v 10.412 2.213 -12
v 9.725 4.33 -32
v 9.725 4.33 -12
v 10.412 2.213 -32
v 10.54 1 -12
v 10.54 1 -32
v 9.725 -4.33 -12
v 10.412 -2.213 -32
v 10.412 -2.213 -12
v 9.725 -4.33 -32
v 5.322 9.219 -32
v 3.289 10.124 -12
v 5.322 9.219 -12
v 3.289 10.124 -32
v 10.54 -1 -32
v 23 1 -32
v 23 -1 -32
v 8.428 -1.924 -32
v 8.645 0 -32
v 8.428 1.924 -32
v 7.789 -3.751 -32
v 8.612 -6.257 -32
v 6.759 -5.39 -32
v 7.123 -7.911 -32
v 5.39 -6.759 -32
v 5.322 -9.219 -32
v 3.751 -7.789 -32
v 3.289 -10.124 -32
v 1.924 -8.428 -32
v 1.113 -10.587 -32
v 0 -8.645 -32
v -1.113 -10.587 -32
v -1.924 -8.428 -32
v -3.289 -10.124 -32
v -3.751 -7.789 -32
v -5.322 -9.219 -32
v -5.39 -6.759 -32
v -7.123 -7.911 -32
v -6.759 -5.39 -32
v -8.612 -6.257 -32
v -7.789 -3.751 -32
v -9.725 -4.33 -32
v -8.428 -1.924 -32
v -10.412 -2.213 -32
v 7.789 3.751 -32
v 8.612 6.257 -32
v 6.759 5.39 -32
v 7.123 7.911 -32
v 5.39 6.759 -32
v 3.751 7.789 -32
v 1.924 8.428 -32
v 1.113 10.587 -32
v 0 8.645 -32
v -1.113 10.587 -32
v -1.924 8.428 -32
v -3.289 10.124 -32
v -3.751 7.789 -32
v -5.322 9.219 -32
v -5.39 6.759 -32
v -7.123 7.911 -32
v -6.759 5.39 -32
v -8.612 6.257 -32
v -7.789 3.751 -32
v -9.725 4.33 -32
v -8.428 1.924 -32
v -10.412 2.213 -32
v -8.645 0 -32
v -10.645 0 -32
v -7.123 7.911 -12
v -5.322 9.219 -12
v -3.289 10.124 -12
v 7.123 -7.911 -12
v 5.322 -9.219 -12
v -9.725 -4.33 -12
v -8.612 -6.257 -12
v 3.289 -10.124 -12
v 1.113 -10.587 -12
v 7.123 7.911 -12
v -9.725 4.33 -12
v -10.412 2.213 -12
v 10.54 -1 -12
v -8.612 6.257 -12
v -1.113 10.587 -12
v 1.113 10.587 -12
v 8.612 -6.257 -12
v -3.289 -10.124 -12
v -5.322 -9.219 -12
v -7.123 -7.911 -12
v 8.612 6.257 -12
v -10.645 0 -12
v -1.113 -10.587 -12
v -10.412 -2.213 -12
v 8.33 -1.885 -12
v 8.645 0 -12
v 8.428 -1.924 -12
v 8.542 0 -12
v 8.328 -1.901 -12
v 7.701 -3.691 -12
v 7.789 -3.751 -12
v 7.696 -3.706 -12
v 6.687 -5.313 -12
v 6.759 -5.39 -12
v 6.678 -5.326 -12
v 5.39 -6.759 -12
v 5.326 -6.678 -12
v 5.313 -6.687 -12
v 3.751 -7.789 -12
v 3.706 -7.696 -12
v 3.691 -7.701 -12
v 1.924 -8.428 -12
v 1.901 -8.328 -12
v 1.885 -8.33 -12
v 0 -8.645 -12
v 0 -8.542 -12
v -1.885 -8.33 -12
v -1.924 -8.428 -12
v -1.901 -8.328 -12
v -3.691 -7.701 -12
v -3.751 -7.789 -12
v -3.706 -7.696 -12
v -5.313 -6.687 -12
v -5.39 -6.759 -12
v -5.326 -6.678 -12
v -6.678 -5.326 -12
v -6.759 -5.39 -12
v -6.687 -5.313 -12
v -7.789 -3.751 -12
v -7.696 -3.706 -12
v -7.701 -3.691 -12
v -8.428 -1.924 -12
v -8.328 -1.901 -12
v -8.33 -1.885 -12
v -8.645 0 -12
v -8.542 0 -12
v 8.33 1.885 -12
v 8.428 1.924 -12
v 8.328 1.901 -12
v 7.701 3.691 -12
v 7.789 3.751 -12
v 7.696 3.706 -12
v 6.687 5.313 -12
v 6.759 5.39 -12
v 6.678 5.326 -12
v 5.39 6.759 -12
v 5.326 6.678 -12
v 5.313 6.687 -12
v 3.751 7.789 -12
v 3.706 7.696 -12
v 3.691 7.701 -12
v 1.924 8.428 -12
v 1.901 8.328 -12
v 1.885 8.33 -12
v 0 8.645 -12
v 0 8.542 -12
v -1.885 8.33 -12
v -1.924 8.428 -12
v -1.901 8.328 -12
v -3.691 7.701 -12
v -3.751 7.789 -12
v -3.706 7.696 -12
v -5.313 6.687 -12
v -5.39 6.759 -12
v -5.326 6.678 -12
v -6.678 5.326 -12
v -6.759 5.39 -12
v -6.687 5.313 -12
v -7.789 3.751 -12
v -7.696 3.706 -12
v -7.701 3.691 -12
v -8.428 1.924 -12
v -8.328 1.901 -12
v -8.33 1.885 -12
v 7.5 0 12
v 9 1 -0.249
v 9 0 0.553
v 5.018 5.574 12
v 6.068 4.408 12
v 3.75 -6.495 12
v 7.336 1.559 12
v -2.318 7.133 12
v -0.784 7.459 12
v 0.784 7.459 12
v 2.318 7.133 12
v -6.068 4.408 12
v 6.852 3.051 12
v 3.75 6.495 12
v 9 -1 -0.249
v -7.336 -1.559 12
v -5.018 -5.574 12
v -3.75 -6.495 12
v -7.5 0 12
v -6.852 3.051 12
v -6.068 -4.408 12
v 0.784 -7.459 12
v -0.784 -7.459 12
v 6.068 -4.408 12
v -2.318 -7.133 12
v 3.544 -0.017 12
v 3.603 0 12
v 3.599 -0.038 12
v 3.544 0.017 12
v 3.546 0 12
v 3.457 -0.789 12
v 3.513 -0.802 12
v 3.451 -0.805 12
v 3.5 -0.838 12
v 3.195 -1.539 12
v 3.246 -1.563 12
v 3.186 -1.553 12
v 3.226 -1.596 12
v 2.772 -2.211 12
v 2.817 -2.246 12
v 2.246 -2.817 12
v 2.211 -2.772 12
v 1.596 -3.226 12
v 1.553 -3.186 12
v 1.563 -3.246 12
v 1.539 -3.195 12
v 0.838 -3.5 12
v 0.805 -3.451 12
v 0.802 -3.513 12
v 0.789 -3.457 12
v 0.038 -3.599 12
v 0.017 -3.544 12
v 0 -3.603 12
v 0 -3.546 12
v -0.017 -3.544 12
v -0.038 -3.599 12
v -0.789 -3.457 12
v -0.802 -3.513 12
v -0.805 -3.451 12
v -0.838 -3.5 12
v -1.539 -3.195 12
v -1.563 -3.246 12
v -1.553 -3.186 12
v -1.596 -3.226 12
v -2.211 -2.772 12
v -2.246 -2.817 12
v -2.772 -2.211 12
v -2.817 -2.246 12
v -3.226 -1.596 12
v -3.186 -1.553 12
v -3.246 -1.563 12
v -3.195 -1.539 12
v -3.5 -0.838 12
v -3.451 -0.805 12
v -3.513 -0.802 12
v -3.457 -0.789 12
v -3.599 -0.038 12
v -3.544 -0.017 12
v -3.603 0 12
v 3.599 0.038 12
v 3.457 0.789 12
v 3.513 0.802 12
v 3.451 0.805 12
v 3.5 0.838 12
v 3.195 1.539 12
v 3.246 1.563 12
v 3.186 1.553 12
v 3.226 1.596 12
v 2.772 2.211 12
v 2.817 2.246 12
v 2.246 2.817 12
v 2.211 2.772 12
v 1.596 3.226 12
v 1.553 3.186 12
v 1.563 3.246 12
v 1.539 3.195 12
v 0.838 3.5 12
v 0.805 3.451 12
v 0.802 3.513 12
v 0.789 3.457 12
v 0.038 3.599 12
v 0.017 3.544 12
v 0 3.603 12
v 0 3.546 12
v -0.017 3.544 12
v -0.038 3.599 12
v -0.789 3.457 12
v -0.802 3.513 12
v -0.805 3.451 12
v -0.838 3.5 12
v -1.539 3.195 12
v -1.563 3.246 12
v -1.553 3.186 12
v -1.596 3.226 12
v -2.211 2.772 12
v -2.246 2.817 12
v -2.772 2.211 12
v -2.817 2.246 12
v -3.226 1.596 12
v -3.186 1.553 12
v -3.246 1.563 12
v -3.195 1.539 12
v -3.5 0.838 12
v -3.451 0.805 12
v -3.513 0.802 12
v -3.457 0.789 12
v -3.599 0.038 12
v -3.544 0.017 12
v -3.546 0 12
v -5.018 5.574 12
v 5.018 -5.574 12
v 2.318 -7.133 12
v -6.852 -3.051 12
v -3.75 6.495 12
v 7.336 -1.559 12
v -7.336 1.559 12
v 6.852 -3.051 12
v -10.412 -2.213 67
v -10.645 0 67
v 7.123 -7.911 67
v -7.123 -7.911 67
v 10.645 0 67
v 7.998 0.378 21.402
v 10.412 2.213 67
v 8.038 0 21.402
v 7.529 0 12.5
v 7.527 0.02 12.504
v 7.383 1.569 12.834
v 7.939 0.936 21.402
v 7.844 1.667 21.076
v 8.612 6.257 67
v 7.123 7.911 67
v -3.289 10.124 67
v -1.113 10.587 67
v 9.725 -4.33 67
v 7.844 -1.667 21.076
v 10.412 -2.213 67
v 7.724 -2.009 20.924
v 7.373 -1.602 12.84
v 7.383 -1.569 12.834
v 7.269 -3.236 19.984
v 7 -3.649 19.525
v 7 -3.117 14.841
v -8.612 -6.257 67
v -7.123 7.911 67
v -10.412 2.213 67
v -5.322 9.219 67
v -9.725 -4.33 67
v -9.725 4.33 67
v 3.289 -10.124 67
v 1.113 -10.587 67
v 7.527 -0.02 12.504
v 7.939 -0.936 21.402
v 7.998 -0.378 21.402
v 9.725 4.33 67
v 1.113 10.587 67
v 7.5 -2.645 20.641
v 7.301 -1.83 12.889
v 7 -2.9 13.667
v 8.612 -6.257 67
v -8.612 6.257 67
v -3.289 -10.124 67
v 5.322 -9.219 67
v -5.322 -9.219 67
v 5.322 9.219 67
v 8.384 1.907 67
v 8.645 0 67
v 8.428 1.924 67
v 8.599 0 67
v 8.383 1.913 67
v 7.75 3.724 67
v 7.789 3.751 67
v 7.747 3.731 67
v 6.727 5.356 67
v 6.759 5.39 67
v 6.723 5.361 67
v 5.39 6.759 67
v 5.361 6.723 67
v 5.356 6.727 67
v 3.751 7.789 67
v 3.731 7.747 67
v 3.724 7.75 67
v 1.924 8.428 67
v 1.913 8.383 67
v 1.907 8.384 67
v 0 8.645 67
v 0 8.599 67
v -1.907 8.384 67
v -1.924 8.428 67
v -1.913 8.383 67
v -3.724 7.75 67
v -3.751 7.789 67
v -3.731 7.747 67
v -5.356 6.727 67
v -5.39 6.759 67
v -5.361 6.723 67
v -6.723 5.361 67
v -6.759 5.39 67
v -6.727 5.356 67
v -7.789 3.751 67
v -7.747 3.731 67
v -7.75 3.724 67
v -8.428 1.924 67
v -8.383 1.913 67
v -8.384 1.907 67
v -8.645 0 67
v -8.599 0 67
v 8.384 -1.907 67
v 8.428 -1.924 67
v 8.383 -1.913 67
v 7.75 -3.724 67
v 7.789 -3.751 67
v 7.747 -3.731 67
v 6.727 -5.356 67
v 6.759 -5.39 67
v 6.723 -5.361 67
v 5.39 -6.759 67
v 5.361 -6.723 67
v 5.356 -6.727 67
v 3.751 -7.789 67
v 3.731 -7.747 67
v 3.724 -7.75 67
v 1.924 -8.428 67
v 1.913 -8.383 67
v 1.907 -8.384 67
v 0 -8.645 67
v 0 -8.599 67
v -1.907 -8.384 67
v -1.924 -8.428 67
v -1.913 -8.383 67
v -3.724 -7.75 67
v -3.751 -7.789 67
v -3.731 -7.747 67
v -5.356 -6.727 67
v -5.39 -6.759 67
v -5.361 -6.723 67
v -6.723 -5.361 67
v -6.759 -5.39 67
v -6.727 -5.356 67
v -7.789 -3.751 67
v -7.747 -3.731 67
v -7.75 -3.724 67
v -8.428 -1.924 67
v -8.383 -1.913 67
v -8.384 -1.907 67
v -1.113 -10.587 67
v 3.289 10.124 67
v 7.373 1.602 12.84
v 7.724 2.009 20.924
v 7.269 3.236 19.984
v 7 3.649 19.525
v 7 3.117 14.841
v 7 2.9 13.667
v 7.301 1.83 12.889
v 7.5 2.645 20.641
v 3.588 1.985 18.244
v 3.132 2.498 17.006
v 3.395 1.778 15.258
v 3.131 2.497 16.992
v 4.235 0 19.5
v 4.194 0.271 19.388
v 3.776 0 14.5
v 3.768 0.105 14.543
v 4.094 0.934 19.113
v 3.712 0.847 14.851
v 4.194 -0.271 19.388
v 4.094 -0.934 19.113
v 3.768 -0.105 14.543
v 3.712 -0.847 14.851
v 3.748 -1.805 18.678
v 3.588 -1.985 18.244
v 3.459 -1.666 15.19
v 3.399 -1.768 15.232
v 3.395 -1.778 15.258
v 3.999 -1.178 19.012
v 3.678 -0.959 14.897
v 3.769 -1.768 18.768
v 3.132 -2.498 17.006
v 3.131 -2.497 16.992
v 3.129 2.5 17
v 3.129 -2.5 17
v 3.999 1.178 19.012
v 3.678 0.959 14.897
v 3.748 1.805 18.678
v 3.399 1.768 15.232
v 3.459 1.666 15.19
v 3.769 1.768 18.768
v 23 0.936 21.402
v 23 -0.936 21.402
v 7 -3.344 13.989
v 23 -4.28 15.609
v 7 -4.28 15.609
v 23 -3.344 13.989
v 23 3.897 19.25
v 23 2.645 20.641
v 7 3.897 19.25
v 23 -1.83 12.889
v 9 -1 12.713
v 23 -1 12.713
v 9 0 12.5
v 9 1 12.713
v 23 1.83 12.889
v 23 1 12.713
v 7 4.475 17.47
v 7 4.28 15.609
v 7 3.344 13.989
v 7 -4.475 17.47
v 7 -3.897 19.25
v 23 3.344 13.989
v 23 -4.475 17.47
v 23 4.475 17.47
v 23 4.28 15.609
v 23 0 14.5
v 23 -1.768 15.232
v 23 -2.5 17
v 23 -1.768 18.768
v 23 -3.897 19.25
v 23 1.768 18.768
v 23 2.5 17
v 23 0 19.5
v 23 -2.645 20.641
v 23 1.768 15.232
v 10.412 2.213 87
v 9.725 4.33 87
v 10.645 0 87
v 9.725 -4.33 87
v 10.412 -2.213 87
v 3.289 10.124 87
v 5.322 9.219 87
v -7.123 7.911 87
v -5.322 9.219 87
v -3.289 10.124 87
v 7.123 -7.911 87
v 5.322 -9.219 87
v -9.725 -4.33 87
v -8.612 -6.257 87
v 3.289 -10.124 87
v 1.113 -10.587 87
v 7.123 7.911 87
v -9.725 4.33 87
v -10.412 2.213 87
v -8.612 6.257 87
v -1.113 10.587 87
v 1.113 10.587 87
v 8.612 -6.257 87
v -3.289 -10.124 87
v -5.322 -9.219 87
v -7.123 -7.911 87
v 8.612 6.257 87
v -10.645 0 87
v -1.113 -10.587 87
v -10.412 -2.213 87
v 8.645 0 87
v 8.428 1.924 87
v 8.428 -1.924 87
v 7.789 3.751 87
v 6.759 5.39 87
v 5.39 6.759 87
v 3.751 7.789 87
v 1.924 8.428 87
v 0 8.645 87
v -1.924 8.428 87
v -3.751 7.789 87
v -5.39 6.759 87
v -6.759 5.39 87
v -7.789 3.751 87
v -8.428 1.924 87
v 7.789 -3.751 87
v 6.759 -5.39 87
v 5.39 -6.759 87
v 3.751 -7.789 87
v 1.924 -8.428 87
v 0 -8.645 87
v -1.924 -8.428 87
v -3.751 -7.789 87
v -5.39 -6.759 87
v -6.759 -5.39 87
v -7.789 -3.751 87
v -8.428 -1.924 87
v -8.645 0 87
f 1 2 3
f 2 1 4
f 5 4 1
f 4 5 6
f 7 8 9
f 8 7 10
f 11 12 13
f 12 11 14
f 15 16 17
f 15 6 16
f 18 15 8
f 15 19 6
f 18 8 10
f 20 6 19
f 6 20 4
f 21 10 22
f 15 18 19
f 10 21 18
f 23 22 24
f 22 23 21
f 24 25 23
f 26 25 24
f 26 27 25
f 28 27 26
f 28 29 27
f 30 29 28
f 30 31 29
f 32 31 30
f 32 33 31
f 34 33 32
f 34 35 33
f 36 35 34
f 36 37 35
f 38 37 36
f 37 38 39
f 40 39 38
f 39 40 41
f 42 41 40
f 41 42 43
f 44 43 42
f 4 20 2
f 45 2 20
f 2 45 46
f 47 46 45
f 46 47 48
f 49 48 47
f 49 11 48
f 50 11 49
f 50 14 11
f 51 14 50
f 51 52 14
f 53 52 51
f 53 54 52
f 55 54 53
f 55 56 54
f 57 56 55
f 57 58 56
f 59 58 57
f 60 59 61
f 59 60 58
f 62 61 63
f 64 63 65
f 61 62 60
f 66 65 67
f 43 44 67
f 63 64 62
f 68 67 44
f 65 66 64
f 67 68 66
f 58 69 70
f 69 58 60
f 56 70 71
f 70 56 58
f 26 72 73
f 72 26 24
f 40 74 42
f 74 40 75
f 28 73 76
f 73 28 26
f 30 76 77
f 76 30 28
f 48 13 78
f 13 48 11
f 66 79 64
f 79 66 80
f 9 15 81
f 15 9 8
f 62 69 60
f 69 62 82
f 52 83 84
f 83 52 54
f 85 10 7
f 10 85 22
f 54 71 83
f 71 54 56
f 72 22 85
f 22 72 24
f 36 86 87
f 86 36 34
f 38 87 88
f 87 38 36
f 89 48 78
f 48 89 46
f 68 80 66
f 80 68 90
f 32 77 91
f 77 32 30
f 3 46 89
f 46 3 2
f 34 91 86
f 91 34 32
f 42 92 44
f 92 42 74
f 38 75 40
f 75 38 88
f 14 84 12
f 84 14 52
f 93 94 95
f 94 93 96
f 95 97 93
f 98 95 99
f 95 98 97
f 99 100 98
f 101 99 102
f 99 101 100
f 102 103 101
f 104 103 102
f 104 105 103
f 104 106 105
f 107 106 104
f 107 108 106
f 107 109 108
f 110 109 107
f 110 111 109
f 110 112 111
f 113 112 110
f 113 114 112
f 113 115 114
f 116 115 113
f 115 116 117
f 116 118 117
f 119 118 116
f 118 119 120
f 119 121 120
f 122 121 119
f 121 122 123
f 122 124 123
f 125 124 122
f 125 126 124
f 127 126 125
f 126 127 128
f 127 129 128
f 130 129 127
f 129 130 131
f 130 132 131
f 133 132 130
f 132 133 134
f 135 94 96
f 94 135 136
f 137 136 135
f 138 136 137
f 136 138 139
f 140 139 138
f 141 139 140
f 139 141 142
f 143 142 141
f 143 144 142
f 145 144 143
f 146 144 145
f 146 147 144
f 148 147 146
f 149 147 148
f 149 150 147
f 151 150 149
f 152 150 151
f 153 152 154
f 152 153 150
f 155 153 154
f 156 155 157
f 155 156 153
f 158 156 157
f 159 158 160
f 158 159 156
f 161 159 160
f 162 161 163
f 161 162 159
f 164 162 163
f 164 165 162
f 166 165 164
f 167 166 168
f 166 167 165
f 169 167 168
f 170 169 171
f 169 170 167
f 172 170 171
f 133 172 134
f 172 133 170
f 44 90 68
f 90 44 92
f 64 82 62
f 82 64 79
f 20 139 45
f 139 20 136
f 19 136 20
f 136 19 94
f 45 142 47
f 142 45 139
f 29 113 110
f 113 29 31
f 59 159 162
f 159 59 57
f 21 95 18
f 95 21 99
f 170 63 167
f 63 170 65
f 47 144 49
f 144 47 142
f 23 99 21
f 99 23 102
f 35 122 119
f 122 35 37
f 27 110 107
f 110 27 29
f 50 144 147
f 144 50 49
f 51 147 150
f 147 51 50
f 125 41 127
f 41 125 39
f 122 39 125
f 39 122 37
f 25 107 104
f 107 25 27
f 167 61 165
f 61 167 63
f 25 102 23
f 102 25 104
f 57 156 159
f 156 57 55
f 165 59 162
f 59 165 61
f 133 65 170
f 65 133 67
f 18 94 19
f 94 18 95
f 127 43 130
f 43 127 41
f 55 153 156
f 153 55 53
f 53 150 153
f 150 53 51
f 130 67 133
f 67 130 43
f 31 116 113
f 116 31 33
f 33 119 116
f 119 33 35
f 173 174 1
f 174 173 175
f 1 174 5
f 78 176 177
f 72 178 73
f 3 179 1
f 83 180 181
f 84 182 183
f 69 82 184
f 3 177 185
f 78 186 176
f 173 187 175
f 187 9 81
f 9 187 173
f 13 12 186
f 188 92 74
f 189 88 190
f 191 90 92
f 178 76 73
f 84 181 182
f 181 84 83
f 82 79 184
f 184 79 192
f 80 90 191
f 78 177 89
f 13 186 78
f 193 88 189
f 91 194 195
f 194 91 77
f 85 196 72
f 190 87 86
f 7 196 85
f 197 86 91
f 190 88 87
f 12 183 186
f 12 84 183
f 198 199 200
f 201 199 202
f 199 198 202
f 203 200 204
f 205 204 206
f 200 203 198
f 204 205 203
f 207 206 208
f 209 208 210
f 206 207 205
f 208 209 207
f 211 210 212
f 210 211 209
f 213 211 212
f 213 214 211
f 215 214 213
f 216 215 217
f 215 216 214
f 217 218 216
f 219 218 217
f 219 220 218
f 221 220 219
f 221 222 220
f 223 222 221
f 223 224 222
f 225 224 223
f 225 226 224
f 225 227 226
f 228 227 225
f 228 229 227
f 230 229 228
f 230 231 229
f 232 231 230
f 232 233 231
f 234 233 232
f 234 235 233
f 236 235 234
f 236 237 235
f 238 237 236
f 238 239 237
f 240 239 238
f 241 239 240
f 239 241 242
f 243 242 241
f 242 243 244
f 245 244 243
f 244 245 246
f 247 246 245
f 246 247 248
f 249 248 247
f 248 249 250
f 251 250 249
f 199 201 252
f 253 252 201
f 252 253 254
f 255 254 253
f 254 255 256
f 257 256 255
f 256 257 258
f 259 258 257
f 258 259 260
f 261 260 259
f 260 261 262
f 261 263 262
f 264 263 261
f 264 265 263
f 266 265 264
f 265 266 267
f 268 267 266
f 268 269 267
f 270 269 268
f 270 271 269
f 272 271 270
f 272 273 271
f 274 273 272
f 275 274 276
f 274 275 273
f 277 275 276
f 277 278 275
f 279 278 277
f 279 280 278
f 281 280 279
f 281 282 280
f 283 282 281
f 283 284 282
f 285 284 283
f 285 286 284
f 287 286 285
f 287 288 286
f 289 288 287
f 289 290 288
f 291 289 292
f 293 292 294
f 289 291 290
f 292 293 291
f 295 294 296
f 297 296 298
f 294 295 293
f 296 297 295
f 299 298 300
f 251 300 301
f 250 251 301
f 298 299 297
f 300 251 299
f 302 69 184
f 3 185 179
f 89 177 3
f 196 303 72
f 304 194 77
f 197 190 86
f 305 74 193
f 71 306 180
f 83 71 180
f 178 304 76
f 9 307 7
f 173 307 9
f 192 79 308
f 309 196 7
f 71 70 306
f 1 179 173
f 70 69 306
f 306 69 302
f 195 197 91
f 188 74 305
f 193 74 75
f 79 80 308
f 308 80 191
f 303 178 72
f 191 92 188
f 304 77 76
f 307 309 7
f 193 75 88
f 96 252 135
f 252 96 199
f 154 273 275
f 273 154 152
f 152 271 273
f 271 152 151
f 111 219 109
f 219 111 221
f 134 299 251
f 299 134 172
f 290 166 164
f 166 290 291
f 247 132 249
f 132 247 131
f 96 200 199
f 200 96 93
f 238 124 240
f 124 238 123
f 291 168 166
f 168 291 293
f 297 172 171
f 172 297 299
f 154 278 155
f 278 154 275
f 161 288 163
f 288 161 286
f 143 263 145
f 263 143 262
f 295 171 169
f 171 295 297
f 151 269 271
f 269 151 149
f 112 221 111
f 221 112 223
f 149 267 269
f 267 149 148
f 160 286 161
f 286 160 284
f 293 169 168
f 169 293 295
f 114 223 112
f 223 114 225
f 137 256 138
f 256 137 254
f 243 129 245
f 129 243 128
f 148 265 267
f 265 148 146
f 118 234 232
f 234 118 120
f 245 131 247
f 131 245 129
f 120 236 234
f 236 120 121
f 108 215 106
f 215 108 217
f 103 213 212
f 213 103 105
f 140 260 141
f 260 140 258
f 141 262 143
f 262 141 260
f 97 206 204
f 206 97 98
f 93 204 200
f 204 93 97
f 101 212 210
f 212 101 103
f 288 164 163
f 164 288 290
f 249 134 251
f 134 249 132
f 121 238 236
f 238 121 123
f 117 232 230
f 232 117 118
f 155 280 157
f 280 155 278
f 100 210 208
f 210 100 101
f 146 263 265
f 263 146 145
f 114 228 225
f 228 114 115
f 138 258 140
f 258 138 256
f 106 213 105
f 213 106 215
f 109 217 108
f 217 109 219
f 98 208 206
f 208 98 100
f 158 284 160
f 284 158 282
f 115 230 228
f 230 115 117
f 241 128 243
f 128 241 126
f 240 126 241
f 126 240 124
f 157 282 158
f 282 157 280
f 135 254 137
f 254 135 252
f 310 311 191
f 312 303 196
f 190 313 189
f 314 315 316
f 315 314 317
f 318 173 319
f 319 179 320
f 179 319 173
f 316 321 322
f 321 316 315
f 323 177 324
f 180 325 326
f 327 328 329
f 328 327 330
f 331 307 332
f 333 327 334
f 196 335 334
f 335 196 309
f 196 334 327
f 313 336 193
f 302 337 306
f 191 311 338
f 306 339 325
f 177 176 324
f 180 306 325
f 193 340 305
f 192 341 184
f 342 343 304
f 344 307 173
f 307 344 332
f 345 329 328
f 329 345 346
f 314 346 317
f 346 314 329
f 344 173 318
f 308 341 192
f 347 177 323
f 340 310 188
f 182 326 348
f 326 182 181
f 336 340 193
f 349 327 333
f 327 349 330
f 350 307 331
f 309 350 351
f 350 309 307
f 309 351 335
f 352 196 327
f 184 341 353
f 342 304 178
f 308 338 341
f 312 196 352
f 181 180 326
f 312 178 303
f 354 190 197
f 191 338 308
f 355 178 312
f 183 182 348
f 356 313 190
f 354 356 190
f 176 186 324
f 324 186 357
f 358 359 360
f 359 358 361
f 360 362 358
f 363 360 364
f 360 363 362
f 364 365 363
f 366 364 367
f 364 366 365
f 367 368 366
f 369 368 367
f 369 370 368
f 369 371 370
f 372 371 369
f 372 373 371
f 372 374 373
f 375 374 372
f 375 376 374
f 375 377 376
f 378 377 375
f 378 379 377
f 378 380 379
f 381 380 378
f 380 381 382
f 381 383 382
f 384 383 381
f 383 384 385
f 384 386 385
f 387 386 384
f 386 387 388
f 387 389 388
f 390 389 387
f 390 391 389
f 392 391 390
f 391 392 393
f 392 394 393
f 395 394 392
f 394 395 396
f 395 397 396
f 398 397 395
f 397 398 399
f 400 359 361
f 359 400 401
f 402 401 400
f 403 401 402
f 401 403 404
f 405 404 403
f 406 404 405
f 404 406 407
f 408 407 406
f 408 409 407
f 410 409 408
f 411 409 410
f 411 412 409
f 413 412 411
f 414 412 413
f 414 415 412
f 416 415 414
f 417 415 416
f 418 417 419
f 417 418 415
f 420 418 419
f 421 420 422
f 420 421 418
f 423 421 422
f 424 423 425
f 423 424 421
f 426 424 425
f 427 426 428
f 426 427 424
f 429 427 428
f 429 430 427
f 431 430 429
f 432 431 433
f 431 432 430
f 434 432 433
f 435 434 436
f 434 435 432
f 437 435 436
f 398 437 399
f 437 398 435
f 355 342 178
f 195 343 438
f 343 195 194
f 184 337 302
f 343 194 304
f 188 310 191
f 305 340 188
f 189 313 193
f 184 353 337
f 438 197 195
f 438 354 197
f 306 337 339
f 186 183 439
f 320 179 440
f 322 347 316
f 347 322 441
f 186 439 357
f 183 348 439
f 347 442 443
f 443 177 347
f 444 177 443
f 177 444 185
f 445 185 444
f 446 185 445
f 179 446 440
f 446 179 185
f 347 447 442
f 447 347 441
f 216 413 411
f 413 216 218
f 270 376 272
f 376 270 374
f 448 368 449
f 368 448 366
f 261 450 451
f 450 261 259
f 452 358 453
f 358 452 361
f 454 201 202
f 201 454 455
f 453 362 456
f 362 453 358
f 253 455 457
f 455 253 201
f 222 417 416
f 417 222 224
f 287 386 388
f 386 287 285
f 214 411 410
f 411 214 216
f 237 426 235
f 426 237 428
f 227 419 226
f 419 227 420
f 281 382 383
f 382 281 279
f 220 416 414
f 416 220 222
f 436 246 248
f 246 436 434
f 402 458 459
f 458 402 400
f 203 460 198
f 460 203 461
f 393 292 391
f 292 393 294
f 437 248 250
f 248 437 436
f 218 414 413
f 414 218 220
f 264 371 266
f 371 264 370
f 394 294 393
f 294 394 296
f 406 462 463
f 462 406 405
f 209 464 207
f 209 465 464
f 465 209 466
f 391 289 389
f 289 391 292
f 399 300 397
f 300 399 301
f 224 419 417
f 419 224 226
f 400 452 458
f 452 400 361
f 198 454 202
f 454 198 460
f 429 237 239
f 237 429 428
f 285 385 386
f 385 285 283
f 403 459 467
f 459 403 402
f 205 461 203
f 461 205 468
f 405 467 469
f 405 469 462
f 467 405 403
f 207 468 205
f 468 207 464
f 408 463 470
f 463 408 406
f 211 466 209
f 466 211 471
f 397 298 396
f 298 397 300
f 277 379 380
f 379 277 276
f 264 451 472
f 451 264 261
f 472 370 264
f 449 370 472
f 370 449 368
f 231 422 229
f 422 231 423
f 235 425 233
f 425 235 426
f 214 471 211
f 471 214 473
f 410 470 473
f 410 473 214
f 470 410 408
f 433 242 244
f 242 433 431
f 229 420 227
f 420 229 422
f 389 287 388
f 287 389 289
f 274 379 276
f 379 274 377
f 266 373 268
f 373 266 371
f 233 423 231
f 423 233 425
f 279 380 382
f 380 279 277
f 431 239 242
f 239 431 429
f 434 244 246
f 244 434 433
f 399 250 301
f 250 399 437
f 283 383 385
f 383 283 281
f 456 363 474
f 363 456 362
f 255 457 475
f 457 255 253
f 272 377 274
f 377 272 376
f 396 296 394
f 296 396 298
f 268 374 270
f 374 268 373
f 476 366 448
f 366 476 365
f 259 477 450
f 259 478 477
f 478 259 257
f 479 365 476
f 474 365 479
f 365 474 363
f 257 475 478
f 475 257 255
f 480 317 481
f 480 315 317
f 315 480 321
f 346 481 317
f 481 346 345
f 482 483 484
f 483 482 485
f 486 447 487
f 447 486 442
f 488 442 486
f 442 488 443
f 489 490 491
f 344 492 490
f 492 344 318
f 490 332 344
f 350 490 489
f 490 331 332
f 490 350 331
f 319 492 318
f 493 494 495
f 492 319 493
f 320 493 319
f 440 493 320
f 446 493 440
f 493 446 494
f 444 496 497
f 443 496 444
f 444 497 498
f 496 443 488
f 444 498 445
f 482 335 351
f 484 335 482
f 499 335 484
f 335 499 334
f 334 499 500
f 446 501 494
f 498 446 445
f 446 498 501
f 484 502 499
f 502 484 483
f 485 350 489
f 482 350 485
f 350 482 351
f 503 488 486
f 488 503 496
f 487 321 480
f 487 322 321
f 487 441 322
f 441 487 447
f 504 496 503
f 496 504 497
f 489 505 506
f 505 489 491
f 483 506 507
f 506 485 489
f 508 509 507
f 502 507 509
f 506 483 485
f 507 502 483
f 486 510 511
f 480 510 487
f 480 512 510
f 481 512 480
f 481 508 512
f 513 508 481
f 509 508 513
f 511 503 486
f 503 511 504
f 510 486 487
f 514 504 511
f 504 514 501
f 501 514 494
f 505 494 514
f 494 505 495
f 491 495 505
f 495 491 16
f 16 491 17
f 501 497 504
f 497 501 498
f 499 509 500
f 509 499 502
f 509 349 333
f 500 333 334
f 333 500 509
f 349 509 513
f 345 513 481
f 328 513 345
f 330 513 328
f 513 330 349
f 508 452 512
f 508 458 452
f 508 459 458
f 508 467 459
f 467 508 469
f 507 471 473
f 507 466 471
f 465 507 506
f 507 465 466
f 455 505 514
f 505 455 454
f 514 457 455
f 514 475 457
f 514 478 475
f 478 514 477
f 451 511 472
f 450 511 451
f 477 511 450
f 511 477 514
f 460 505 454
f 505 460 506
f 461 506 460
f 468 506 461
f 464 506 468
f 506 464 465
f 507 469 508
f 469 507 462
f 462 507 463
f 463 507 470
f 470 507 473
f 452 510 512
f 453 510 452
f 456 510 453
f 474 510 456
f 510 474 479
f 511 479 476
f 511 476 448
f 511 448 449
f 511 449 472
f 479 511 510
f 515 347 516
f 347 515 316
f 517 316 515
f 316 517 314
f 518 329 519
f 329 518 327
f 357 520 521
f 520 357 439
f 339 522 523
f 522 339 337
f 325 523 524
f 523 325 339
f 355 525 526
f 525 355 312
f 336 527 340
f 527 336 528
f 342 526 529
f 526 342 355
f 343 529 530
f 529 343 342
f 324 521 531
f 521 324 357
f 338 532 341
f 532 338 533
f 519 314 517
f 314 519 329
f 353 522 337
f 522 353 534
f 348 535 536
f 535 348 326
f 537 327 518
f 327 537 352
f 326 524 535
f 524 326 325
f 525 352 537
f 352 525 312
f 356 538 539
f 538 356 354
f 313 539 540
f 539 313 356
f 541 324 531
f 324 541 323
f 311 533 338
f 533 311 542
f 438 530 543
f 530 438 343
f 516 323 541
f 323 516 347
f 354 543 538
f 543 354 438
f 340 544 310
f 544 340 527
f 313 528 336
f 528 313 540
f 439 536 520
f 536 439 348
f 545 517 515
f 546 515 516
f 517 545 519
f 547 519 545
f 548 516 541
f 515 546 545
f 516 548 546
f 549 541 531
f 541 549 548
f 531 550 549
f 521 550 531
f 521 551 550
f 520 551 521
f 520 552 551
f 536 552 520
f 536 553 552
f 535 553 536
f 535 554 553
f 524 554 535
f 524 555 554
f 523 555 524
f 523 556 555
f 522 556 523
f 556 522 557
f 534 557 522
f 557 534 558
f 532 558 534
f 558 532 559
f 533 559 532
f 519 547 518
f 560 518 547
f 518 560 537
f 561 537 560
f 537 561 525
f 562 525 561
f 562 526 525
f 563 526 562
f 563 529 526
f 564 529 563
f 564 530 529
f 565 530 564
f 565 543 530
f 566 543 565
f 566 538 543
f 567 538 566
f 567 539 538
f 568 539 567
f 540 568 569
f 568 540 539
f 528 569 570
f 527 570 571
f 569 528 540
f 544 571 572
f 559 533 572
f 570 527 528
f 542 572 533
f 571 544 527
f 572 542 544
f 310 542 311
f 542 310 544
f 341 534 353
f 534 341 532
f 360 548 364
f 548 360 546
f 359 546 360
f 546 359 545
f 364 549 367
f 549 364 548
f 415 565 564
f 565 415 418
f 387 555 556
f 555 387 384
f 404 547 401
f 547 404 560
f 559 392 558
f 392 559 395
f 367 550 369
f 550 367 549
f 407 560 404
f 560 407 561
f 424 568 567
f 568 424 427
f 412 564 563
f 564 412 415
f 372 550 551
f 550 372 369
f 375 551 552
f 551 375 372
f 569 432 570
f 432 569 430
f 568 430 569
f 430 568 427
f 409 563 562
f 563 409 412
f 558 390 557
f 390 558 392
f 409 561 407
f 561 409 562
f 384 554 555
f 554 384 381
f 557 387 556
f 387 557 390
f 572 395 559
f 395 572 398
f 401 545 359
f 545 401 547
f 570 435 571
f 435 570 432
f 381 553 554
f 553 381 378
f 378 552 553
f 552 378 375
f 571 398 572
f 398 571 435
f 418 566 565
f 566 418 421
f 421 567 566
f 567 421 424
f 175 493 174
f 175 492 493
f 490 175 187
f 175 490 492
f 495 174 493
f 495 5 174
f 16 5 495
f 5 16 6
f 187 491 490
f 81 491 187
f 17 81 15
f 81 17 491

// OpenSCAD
od = 21.29;
od_rad = od/2;
od_min = 15;
od_min_rad = 15/2;

output_cyl_ht = 55;
wall_thick = 2;
input_cyl_ht = 24;


module output() {
	difference() {
		cylinder(r2=od_rad, r1=od_min_rad, h=output_cyl_ht, center=true);
		cylinder(r2=od_rad-wall_thick, r1=7/2, h=output_cyl_ht+1, center=true);
	}
}

module input() {
	difference() {
		cylinder(r1=od_rad, r2=od_min_rad, h=input_cyl_ht, center=true);
		cylinder(r1=od_rad-wall_thick, r2=7/2, h=input_cyl_ht+1, center=true);
	}
}

module glued() {
	difference() {
		cylinder(r=od_rad, h=20, center=true);
		cylinder(r=od_rad-wall_thick, h=27, center=true);
	}
}

module nipple() {
	difference() {
		cylinder(r=9/2, h=26, center=true);
		cylinder(r=9/2-wall_thick, h=28, center=true);
	}
}

union() {
translate([0,0,-22]) glued();
input();
difference() {
	union() {
		translate([0,0,output_cyl_ht/2+12]) output();
		translate([15,0,17]) rotate([0,90,0]) cylinder(r=9/2, h=16, center=true);
	}
	translate([15,0,17]) rotate([0,90,0]) cylinder(r=9/2-wall_thick, h=30, center=true);
}
translate([0,0,77]) glued();
translate([16,0,-9.5]) cube(size=[14,2,45], center=true);
}
